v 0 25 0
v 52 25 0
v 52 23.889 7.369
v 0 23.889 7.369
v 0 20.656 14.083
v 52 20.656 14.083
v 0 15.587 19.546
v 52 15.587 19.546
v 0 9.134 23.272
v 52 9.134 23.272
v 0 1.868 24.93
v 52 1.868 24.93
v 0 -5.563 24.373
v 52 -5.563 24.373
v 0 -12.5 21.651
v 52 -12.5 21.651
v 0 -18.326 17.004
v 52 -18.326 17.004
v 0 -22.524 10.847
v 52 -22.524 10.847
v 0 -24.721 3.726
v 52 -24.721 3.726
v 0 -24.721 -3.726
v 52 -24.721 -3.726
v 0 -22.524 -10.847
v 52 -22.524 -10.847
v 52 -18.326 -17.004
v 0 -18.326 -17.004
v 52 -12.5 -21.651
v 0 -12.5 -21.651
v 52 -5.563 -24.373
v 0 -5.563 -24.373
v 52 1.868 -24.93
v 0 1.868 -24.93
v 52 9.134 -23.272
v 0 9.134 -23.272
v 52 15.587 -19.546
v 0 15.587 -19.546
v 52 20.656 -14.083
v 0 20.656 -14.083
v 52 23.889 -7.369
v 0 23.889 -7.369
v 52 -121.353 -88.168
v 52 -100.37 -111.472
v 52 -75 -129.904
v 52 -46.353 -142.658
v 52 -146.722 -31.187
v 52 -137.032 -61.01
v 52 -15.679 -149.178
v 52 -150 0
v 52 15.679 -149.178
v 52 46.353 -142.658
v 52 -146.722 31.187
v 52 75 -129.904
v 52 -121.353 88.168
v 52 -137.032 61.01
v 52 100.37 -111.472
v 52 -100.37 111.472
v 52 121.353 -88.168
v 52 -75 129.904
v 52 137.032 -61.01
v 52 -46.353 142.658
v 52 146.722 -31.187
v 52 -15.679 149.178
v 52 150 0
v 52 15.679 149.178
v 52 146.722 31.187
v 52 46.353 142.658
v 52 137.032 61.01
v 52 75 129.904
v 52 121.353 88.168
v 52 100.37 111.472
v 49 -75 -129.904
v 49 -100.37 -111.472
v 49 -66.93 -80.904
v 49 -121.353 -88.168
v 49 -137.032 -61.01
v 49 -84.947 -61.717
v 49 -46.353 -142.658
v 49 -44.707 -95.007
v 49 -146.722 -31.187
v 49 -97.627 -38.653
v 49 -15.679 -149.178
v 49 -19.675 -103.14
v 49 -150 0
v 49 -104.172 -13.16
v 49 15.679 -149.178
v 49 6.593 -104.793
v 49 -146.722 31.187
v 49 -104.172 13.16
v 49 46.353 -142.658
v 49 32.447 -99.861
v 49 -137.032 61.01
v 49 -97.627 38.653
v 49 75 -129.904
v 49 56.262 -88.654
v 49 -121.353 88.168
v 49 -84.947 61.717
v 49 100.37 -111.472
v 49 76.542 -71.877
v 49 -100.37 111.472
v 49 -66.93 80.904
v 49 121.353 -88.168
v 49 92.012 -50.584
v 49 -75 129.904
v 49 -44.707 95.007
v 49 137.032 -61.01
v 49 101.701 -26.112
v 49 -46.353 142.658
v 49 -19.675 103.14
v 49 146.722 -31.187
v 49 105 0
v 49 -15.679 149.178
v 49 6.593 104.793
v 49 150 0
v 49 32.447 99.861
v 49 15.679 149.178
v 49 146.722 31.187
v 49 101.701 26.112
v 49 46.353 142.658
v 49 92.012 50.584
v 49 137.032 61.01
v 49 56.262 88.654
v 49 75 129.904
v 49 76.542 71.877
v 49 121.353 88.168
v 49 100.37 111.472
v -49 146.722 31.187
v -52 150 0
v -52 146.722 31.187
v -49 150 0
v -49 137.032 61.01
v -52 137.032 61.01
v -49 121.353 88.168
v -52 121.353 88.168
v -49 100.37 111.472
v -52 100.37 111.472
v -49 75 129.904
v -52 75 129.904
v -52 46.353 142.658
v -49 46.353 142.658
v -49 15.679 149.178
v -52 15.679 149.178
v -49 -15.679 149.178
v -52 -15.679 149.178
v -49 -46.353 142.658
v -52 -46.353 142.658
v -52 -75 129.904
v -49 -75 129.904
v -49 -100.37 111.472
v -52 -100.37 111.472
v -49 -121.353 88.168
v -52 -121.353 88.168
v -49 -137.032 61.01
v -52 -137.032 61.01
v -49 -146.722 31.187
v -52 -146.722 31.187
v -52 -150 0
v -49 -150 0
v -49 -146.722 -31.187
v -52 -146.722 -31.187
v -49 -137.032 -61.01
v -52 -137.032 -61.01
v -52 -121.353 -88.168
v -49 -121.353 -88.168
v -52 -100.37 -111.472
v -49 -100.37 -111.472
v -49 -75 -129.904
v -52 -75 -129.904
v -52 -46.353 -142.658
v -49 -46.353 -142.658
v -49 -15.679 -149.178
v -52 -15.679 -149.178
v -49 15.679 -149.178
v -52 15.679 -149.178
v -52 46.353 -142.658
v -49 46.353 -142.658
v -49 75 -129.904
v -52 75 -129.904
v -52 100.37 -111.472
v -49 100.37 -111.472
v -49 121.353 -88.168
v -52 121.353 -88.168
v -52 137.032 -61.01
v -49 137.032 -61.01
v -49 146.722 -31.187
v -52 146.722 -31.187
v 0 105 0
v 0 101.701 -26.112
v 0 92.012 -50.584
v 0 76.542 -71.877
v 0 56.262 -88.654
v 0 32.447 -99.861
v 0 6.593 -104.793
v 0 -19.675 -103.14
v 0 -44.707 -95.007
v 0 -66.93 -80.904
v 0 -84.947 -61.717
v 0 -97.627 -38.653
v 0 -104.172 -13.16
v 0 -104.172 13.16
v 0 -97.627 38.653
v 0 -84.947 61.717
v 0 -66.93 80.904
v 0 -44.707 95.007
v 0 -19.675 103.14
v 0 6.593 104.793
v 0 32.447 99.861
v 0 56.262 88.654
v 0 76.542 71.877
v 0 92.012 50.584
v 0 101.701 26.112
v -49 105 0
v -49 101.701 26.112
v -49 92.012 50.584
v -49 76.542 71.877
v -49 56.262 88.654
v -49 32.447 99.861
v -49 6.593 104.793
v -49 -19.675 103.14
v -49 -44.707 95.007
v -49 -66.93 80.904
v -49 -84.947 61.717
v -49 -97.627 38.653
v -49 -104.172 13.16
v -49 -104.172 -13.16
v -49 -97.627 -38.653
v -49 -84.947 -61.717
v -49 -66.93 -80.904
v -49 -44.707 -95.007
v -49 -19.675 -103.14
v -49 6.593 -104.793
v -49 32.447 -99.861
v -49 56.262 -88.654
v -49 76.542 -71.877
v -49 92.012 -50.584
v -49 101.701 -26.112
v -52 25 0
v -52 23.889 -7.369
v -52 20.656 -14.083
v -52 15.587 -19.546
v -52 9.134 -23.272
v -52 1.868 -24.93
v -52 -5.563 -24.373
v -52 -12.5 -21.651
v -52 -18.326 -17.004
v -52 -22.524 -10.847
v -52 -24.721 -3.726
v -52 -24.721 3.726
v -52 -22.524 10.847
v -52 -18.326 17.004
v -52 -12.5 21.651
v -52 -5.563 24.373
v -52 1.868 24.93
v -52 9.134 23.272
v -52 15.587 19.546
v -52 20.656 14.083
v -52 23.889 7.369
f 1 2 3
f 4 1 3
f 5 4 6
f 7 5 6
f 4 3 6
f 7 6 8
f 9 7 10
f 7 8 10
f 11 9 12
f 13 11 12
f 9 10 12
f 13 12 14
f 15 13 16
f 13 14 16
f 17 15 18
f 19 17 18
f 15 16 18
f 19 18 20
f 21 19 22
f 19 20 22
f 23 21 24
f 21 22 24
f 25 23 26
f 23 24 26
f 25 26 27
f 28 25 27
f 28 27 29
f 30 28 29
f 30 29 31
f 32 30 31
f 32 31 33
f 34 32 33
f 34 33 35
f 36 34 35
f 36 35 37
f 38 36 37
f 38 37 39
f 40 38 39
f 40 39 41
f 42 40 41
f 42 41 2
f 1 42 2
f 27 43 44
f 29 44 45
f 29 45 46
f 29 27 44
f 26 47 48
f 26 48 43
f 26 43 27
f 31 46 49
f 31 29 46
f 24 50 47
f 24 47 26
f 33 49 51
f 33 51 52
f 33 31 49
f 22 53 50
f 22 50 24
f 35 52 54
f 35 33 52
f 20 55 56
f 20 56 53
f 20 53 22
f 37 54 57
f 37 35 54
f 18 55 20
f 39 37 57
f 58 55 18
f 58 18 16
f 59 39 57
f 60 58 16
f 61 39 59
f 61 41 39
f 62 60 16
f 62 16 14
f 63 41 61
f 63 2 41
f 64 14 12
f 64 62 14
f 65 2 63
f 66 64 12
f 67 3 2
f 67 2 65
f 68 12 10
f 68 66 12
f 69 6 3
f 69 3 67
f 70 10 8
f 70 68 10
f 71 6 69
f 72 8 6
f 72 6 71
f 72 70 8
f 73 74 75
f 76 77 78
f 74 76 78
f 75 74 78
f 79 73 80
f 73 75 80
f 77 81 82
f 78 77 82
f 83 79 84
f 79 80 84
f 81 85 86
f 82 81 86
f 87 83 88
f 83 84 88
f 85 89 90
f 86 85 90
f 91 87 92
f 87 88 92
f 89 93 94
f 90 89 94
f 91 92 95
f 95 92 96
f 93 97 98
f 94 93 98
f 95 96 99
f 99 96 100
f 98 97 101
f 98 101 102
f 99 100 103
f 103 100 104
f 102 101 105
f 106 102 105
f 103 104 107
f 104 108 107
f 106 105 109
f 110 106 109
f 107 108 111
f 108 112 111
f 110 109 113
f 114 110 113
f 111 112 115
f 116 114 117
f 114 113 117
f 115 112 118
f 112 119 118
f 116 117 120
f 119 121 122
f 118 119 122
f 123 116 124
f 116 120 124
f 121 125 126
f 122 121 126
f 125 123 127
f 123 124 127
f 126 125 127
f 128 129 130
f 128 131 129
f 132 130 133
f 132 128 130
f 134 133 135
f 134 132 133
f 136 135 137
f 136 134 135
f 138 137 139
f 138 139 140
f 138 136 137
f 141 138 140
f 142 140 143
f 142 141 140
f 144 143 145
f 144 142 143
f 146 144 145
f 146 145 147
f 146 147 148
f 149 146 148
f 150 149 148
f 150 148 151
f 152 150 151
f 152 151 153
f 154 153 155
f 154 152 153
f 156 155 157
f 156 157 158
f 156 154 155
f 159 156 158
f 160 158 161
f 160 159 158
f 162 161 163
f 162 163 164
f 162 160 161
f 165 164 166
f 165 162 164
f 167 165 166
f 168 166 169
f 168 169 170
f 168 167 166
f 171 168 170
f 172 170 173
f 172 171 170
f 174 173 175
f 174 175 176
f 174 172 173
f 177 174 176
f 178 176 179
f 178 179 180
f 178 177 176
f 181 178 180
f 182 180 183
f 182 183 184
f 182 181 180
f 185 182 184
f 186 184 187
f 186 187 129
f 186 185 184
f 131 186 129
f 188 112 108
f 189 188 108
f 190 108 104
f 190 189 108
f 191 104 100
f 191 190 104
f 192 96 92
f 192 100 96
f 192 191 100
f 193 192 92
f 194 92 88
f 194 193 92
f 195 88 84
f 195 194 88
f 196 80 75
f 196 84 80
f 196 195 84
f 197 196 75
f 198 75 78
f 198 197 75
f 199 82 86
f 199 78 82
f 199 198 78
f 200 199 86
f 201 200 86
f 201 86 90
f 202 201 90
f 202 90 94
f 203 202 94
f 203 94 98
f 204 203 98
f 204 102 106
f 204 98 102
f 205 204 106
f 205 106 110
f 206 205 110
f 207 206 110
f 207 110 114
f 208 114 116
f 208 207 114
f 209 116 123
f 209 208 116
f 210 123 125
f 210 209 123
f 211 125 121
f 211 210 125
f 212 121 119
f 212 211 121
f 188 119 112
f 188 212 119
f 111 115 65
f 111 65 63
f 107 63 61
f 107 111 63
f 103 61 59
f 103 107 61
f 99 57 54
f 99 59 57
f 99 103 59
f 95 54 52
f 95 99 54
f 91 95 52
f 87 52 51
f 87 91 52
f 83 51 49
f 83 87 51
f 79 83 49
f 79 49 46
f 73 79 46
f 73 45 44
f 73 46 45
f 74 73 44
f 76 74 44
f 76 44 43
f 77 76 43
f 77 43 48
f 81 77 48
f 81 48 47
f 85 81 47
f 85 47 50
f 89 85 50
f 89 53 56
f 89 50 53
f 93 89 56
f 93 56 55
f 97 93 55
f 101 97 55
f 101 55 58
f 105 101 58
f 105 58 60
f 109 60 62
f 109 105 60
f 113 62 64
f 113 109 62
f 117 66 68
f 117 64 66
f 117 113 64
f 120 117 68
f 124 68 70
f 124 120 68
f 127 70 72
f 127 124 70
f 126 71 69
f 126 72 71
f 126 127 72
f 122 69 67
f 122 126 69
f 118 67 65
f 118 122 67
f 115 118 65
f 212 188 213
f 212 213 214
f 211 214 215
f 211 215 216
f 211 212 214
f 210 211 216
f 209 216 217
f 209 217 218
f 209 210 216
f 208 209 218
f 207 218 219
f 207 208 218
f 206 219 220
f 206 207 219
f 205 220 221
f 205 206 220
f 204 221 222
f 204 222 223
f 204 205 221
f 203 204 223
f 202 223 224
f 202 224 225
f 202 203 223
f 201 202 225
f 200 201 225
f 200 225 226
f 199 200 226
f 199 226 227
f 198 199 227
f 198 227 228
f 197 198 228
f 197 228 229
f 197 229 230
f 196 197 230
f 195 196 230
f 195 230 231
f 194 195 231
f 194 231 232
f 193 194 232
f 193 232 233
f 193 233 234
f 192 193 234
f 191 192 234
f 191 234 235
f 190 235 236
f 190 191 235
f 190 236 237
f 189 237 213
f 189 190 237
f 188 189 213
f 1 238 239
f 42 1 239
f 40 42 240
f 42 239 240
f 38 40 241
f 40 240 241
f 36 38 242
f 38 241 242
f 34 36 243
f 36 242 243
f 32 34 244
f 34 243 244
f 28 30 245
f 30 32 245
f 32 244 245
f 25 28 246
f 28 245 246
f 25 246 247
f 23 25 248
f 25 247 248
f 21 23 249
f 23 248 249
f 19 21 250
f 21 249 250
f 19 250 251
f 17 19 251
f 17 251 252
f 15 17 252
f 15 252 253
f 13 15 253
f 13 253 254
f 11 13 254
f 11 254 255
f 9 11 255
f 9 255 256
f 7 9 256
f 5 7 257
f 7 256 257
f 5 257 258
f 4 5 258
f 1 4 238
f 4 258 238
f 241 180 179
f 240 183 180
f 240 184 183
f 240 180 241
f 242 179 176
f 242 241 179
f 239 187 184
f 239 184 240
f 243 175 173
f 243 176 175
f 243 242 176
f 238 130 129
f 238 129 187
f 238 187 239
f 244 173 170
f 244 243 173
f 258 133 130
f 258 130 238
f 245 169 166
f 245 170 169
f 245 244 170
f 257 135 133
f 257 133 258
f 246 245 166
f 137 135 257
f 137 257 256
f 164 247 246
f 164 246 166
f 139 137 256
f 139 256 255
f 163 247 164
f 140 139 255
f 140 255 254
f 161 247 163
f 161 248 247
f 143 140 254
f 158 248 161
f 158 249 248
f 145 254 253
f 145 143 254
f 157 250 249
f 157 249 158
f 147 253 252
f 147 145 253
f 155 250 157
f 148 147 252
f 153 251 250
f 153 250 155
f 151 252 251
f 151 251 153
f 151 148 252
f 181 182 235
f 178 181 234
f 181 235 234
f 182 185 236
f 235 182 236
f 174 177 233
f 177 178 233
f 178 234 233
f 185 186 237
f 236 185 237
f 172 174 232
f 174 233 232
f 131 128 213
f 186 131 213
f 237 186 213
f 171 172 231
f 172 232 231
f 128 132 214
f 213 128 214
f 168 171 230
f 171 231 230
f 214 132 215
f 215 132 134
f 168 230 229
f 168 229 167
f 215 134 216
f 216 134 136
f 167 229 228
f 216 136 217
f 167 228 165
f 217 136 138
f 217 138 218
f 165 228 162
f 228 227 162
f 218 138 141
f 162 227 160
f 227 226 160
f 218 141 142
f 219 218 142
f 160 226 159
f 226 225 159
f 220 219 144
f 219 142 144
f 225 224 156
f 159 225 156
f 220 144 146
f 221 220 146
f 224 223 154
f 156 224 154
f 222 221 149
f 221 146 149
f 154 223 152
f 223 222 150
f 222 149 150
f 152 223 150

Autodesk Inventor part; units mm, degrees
ref_plane "YZ Plane" through (0, 0, 0) normal (1, 0, 0) x (0, 1, 0)
ref_plane "XZ Plane" through (0, 0, 0) normal (0, 1, 0) x (-1, 0, 0)
ref_plane "XY Plane" through (0, 0, 0) normal (0, 0, 1) x (1, 0, 0)
sketch "Sketch1" plane through (0, 0, 0) normal (0, 0, 1) x (1, 0, 0)
  line L0 (0, 0) -> (52, 0)
  line L1 (52, 0) -> (52, 150)
  line L2 (52, 150) -> (49, 150)
  line L3 (49, 150) -> (49, 105)
  line L4 (49, 105) -> (0, 105)
  line L5 (0, 105) -> (0, 0)
  line L6 (0, 25) -> (52, 25)
  dimension "d0" = 52
  dimension "d1" = 150
  dimension "d2" = 3
  dimension "d3" = 25
  dimension "d4" = 105
revolve "Revolution1" add sketch "Sketch1" angle 360 about axis through (0, 0, 0) along (1, 0, 0) contours L5 L4 L3 L2 L1 L6
mirror "Mirror1" about plane through (0, 65, 0) normal (-1, 0, 0) of "Revolution1"
properties part number "rolka_filamentu"
